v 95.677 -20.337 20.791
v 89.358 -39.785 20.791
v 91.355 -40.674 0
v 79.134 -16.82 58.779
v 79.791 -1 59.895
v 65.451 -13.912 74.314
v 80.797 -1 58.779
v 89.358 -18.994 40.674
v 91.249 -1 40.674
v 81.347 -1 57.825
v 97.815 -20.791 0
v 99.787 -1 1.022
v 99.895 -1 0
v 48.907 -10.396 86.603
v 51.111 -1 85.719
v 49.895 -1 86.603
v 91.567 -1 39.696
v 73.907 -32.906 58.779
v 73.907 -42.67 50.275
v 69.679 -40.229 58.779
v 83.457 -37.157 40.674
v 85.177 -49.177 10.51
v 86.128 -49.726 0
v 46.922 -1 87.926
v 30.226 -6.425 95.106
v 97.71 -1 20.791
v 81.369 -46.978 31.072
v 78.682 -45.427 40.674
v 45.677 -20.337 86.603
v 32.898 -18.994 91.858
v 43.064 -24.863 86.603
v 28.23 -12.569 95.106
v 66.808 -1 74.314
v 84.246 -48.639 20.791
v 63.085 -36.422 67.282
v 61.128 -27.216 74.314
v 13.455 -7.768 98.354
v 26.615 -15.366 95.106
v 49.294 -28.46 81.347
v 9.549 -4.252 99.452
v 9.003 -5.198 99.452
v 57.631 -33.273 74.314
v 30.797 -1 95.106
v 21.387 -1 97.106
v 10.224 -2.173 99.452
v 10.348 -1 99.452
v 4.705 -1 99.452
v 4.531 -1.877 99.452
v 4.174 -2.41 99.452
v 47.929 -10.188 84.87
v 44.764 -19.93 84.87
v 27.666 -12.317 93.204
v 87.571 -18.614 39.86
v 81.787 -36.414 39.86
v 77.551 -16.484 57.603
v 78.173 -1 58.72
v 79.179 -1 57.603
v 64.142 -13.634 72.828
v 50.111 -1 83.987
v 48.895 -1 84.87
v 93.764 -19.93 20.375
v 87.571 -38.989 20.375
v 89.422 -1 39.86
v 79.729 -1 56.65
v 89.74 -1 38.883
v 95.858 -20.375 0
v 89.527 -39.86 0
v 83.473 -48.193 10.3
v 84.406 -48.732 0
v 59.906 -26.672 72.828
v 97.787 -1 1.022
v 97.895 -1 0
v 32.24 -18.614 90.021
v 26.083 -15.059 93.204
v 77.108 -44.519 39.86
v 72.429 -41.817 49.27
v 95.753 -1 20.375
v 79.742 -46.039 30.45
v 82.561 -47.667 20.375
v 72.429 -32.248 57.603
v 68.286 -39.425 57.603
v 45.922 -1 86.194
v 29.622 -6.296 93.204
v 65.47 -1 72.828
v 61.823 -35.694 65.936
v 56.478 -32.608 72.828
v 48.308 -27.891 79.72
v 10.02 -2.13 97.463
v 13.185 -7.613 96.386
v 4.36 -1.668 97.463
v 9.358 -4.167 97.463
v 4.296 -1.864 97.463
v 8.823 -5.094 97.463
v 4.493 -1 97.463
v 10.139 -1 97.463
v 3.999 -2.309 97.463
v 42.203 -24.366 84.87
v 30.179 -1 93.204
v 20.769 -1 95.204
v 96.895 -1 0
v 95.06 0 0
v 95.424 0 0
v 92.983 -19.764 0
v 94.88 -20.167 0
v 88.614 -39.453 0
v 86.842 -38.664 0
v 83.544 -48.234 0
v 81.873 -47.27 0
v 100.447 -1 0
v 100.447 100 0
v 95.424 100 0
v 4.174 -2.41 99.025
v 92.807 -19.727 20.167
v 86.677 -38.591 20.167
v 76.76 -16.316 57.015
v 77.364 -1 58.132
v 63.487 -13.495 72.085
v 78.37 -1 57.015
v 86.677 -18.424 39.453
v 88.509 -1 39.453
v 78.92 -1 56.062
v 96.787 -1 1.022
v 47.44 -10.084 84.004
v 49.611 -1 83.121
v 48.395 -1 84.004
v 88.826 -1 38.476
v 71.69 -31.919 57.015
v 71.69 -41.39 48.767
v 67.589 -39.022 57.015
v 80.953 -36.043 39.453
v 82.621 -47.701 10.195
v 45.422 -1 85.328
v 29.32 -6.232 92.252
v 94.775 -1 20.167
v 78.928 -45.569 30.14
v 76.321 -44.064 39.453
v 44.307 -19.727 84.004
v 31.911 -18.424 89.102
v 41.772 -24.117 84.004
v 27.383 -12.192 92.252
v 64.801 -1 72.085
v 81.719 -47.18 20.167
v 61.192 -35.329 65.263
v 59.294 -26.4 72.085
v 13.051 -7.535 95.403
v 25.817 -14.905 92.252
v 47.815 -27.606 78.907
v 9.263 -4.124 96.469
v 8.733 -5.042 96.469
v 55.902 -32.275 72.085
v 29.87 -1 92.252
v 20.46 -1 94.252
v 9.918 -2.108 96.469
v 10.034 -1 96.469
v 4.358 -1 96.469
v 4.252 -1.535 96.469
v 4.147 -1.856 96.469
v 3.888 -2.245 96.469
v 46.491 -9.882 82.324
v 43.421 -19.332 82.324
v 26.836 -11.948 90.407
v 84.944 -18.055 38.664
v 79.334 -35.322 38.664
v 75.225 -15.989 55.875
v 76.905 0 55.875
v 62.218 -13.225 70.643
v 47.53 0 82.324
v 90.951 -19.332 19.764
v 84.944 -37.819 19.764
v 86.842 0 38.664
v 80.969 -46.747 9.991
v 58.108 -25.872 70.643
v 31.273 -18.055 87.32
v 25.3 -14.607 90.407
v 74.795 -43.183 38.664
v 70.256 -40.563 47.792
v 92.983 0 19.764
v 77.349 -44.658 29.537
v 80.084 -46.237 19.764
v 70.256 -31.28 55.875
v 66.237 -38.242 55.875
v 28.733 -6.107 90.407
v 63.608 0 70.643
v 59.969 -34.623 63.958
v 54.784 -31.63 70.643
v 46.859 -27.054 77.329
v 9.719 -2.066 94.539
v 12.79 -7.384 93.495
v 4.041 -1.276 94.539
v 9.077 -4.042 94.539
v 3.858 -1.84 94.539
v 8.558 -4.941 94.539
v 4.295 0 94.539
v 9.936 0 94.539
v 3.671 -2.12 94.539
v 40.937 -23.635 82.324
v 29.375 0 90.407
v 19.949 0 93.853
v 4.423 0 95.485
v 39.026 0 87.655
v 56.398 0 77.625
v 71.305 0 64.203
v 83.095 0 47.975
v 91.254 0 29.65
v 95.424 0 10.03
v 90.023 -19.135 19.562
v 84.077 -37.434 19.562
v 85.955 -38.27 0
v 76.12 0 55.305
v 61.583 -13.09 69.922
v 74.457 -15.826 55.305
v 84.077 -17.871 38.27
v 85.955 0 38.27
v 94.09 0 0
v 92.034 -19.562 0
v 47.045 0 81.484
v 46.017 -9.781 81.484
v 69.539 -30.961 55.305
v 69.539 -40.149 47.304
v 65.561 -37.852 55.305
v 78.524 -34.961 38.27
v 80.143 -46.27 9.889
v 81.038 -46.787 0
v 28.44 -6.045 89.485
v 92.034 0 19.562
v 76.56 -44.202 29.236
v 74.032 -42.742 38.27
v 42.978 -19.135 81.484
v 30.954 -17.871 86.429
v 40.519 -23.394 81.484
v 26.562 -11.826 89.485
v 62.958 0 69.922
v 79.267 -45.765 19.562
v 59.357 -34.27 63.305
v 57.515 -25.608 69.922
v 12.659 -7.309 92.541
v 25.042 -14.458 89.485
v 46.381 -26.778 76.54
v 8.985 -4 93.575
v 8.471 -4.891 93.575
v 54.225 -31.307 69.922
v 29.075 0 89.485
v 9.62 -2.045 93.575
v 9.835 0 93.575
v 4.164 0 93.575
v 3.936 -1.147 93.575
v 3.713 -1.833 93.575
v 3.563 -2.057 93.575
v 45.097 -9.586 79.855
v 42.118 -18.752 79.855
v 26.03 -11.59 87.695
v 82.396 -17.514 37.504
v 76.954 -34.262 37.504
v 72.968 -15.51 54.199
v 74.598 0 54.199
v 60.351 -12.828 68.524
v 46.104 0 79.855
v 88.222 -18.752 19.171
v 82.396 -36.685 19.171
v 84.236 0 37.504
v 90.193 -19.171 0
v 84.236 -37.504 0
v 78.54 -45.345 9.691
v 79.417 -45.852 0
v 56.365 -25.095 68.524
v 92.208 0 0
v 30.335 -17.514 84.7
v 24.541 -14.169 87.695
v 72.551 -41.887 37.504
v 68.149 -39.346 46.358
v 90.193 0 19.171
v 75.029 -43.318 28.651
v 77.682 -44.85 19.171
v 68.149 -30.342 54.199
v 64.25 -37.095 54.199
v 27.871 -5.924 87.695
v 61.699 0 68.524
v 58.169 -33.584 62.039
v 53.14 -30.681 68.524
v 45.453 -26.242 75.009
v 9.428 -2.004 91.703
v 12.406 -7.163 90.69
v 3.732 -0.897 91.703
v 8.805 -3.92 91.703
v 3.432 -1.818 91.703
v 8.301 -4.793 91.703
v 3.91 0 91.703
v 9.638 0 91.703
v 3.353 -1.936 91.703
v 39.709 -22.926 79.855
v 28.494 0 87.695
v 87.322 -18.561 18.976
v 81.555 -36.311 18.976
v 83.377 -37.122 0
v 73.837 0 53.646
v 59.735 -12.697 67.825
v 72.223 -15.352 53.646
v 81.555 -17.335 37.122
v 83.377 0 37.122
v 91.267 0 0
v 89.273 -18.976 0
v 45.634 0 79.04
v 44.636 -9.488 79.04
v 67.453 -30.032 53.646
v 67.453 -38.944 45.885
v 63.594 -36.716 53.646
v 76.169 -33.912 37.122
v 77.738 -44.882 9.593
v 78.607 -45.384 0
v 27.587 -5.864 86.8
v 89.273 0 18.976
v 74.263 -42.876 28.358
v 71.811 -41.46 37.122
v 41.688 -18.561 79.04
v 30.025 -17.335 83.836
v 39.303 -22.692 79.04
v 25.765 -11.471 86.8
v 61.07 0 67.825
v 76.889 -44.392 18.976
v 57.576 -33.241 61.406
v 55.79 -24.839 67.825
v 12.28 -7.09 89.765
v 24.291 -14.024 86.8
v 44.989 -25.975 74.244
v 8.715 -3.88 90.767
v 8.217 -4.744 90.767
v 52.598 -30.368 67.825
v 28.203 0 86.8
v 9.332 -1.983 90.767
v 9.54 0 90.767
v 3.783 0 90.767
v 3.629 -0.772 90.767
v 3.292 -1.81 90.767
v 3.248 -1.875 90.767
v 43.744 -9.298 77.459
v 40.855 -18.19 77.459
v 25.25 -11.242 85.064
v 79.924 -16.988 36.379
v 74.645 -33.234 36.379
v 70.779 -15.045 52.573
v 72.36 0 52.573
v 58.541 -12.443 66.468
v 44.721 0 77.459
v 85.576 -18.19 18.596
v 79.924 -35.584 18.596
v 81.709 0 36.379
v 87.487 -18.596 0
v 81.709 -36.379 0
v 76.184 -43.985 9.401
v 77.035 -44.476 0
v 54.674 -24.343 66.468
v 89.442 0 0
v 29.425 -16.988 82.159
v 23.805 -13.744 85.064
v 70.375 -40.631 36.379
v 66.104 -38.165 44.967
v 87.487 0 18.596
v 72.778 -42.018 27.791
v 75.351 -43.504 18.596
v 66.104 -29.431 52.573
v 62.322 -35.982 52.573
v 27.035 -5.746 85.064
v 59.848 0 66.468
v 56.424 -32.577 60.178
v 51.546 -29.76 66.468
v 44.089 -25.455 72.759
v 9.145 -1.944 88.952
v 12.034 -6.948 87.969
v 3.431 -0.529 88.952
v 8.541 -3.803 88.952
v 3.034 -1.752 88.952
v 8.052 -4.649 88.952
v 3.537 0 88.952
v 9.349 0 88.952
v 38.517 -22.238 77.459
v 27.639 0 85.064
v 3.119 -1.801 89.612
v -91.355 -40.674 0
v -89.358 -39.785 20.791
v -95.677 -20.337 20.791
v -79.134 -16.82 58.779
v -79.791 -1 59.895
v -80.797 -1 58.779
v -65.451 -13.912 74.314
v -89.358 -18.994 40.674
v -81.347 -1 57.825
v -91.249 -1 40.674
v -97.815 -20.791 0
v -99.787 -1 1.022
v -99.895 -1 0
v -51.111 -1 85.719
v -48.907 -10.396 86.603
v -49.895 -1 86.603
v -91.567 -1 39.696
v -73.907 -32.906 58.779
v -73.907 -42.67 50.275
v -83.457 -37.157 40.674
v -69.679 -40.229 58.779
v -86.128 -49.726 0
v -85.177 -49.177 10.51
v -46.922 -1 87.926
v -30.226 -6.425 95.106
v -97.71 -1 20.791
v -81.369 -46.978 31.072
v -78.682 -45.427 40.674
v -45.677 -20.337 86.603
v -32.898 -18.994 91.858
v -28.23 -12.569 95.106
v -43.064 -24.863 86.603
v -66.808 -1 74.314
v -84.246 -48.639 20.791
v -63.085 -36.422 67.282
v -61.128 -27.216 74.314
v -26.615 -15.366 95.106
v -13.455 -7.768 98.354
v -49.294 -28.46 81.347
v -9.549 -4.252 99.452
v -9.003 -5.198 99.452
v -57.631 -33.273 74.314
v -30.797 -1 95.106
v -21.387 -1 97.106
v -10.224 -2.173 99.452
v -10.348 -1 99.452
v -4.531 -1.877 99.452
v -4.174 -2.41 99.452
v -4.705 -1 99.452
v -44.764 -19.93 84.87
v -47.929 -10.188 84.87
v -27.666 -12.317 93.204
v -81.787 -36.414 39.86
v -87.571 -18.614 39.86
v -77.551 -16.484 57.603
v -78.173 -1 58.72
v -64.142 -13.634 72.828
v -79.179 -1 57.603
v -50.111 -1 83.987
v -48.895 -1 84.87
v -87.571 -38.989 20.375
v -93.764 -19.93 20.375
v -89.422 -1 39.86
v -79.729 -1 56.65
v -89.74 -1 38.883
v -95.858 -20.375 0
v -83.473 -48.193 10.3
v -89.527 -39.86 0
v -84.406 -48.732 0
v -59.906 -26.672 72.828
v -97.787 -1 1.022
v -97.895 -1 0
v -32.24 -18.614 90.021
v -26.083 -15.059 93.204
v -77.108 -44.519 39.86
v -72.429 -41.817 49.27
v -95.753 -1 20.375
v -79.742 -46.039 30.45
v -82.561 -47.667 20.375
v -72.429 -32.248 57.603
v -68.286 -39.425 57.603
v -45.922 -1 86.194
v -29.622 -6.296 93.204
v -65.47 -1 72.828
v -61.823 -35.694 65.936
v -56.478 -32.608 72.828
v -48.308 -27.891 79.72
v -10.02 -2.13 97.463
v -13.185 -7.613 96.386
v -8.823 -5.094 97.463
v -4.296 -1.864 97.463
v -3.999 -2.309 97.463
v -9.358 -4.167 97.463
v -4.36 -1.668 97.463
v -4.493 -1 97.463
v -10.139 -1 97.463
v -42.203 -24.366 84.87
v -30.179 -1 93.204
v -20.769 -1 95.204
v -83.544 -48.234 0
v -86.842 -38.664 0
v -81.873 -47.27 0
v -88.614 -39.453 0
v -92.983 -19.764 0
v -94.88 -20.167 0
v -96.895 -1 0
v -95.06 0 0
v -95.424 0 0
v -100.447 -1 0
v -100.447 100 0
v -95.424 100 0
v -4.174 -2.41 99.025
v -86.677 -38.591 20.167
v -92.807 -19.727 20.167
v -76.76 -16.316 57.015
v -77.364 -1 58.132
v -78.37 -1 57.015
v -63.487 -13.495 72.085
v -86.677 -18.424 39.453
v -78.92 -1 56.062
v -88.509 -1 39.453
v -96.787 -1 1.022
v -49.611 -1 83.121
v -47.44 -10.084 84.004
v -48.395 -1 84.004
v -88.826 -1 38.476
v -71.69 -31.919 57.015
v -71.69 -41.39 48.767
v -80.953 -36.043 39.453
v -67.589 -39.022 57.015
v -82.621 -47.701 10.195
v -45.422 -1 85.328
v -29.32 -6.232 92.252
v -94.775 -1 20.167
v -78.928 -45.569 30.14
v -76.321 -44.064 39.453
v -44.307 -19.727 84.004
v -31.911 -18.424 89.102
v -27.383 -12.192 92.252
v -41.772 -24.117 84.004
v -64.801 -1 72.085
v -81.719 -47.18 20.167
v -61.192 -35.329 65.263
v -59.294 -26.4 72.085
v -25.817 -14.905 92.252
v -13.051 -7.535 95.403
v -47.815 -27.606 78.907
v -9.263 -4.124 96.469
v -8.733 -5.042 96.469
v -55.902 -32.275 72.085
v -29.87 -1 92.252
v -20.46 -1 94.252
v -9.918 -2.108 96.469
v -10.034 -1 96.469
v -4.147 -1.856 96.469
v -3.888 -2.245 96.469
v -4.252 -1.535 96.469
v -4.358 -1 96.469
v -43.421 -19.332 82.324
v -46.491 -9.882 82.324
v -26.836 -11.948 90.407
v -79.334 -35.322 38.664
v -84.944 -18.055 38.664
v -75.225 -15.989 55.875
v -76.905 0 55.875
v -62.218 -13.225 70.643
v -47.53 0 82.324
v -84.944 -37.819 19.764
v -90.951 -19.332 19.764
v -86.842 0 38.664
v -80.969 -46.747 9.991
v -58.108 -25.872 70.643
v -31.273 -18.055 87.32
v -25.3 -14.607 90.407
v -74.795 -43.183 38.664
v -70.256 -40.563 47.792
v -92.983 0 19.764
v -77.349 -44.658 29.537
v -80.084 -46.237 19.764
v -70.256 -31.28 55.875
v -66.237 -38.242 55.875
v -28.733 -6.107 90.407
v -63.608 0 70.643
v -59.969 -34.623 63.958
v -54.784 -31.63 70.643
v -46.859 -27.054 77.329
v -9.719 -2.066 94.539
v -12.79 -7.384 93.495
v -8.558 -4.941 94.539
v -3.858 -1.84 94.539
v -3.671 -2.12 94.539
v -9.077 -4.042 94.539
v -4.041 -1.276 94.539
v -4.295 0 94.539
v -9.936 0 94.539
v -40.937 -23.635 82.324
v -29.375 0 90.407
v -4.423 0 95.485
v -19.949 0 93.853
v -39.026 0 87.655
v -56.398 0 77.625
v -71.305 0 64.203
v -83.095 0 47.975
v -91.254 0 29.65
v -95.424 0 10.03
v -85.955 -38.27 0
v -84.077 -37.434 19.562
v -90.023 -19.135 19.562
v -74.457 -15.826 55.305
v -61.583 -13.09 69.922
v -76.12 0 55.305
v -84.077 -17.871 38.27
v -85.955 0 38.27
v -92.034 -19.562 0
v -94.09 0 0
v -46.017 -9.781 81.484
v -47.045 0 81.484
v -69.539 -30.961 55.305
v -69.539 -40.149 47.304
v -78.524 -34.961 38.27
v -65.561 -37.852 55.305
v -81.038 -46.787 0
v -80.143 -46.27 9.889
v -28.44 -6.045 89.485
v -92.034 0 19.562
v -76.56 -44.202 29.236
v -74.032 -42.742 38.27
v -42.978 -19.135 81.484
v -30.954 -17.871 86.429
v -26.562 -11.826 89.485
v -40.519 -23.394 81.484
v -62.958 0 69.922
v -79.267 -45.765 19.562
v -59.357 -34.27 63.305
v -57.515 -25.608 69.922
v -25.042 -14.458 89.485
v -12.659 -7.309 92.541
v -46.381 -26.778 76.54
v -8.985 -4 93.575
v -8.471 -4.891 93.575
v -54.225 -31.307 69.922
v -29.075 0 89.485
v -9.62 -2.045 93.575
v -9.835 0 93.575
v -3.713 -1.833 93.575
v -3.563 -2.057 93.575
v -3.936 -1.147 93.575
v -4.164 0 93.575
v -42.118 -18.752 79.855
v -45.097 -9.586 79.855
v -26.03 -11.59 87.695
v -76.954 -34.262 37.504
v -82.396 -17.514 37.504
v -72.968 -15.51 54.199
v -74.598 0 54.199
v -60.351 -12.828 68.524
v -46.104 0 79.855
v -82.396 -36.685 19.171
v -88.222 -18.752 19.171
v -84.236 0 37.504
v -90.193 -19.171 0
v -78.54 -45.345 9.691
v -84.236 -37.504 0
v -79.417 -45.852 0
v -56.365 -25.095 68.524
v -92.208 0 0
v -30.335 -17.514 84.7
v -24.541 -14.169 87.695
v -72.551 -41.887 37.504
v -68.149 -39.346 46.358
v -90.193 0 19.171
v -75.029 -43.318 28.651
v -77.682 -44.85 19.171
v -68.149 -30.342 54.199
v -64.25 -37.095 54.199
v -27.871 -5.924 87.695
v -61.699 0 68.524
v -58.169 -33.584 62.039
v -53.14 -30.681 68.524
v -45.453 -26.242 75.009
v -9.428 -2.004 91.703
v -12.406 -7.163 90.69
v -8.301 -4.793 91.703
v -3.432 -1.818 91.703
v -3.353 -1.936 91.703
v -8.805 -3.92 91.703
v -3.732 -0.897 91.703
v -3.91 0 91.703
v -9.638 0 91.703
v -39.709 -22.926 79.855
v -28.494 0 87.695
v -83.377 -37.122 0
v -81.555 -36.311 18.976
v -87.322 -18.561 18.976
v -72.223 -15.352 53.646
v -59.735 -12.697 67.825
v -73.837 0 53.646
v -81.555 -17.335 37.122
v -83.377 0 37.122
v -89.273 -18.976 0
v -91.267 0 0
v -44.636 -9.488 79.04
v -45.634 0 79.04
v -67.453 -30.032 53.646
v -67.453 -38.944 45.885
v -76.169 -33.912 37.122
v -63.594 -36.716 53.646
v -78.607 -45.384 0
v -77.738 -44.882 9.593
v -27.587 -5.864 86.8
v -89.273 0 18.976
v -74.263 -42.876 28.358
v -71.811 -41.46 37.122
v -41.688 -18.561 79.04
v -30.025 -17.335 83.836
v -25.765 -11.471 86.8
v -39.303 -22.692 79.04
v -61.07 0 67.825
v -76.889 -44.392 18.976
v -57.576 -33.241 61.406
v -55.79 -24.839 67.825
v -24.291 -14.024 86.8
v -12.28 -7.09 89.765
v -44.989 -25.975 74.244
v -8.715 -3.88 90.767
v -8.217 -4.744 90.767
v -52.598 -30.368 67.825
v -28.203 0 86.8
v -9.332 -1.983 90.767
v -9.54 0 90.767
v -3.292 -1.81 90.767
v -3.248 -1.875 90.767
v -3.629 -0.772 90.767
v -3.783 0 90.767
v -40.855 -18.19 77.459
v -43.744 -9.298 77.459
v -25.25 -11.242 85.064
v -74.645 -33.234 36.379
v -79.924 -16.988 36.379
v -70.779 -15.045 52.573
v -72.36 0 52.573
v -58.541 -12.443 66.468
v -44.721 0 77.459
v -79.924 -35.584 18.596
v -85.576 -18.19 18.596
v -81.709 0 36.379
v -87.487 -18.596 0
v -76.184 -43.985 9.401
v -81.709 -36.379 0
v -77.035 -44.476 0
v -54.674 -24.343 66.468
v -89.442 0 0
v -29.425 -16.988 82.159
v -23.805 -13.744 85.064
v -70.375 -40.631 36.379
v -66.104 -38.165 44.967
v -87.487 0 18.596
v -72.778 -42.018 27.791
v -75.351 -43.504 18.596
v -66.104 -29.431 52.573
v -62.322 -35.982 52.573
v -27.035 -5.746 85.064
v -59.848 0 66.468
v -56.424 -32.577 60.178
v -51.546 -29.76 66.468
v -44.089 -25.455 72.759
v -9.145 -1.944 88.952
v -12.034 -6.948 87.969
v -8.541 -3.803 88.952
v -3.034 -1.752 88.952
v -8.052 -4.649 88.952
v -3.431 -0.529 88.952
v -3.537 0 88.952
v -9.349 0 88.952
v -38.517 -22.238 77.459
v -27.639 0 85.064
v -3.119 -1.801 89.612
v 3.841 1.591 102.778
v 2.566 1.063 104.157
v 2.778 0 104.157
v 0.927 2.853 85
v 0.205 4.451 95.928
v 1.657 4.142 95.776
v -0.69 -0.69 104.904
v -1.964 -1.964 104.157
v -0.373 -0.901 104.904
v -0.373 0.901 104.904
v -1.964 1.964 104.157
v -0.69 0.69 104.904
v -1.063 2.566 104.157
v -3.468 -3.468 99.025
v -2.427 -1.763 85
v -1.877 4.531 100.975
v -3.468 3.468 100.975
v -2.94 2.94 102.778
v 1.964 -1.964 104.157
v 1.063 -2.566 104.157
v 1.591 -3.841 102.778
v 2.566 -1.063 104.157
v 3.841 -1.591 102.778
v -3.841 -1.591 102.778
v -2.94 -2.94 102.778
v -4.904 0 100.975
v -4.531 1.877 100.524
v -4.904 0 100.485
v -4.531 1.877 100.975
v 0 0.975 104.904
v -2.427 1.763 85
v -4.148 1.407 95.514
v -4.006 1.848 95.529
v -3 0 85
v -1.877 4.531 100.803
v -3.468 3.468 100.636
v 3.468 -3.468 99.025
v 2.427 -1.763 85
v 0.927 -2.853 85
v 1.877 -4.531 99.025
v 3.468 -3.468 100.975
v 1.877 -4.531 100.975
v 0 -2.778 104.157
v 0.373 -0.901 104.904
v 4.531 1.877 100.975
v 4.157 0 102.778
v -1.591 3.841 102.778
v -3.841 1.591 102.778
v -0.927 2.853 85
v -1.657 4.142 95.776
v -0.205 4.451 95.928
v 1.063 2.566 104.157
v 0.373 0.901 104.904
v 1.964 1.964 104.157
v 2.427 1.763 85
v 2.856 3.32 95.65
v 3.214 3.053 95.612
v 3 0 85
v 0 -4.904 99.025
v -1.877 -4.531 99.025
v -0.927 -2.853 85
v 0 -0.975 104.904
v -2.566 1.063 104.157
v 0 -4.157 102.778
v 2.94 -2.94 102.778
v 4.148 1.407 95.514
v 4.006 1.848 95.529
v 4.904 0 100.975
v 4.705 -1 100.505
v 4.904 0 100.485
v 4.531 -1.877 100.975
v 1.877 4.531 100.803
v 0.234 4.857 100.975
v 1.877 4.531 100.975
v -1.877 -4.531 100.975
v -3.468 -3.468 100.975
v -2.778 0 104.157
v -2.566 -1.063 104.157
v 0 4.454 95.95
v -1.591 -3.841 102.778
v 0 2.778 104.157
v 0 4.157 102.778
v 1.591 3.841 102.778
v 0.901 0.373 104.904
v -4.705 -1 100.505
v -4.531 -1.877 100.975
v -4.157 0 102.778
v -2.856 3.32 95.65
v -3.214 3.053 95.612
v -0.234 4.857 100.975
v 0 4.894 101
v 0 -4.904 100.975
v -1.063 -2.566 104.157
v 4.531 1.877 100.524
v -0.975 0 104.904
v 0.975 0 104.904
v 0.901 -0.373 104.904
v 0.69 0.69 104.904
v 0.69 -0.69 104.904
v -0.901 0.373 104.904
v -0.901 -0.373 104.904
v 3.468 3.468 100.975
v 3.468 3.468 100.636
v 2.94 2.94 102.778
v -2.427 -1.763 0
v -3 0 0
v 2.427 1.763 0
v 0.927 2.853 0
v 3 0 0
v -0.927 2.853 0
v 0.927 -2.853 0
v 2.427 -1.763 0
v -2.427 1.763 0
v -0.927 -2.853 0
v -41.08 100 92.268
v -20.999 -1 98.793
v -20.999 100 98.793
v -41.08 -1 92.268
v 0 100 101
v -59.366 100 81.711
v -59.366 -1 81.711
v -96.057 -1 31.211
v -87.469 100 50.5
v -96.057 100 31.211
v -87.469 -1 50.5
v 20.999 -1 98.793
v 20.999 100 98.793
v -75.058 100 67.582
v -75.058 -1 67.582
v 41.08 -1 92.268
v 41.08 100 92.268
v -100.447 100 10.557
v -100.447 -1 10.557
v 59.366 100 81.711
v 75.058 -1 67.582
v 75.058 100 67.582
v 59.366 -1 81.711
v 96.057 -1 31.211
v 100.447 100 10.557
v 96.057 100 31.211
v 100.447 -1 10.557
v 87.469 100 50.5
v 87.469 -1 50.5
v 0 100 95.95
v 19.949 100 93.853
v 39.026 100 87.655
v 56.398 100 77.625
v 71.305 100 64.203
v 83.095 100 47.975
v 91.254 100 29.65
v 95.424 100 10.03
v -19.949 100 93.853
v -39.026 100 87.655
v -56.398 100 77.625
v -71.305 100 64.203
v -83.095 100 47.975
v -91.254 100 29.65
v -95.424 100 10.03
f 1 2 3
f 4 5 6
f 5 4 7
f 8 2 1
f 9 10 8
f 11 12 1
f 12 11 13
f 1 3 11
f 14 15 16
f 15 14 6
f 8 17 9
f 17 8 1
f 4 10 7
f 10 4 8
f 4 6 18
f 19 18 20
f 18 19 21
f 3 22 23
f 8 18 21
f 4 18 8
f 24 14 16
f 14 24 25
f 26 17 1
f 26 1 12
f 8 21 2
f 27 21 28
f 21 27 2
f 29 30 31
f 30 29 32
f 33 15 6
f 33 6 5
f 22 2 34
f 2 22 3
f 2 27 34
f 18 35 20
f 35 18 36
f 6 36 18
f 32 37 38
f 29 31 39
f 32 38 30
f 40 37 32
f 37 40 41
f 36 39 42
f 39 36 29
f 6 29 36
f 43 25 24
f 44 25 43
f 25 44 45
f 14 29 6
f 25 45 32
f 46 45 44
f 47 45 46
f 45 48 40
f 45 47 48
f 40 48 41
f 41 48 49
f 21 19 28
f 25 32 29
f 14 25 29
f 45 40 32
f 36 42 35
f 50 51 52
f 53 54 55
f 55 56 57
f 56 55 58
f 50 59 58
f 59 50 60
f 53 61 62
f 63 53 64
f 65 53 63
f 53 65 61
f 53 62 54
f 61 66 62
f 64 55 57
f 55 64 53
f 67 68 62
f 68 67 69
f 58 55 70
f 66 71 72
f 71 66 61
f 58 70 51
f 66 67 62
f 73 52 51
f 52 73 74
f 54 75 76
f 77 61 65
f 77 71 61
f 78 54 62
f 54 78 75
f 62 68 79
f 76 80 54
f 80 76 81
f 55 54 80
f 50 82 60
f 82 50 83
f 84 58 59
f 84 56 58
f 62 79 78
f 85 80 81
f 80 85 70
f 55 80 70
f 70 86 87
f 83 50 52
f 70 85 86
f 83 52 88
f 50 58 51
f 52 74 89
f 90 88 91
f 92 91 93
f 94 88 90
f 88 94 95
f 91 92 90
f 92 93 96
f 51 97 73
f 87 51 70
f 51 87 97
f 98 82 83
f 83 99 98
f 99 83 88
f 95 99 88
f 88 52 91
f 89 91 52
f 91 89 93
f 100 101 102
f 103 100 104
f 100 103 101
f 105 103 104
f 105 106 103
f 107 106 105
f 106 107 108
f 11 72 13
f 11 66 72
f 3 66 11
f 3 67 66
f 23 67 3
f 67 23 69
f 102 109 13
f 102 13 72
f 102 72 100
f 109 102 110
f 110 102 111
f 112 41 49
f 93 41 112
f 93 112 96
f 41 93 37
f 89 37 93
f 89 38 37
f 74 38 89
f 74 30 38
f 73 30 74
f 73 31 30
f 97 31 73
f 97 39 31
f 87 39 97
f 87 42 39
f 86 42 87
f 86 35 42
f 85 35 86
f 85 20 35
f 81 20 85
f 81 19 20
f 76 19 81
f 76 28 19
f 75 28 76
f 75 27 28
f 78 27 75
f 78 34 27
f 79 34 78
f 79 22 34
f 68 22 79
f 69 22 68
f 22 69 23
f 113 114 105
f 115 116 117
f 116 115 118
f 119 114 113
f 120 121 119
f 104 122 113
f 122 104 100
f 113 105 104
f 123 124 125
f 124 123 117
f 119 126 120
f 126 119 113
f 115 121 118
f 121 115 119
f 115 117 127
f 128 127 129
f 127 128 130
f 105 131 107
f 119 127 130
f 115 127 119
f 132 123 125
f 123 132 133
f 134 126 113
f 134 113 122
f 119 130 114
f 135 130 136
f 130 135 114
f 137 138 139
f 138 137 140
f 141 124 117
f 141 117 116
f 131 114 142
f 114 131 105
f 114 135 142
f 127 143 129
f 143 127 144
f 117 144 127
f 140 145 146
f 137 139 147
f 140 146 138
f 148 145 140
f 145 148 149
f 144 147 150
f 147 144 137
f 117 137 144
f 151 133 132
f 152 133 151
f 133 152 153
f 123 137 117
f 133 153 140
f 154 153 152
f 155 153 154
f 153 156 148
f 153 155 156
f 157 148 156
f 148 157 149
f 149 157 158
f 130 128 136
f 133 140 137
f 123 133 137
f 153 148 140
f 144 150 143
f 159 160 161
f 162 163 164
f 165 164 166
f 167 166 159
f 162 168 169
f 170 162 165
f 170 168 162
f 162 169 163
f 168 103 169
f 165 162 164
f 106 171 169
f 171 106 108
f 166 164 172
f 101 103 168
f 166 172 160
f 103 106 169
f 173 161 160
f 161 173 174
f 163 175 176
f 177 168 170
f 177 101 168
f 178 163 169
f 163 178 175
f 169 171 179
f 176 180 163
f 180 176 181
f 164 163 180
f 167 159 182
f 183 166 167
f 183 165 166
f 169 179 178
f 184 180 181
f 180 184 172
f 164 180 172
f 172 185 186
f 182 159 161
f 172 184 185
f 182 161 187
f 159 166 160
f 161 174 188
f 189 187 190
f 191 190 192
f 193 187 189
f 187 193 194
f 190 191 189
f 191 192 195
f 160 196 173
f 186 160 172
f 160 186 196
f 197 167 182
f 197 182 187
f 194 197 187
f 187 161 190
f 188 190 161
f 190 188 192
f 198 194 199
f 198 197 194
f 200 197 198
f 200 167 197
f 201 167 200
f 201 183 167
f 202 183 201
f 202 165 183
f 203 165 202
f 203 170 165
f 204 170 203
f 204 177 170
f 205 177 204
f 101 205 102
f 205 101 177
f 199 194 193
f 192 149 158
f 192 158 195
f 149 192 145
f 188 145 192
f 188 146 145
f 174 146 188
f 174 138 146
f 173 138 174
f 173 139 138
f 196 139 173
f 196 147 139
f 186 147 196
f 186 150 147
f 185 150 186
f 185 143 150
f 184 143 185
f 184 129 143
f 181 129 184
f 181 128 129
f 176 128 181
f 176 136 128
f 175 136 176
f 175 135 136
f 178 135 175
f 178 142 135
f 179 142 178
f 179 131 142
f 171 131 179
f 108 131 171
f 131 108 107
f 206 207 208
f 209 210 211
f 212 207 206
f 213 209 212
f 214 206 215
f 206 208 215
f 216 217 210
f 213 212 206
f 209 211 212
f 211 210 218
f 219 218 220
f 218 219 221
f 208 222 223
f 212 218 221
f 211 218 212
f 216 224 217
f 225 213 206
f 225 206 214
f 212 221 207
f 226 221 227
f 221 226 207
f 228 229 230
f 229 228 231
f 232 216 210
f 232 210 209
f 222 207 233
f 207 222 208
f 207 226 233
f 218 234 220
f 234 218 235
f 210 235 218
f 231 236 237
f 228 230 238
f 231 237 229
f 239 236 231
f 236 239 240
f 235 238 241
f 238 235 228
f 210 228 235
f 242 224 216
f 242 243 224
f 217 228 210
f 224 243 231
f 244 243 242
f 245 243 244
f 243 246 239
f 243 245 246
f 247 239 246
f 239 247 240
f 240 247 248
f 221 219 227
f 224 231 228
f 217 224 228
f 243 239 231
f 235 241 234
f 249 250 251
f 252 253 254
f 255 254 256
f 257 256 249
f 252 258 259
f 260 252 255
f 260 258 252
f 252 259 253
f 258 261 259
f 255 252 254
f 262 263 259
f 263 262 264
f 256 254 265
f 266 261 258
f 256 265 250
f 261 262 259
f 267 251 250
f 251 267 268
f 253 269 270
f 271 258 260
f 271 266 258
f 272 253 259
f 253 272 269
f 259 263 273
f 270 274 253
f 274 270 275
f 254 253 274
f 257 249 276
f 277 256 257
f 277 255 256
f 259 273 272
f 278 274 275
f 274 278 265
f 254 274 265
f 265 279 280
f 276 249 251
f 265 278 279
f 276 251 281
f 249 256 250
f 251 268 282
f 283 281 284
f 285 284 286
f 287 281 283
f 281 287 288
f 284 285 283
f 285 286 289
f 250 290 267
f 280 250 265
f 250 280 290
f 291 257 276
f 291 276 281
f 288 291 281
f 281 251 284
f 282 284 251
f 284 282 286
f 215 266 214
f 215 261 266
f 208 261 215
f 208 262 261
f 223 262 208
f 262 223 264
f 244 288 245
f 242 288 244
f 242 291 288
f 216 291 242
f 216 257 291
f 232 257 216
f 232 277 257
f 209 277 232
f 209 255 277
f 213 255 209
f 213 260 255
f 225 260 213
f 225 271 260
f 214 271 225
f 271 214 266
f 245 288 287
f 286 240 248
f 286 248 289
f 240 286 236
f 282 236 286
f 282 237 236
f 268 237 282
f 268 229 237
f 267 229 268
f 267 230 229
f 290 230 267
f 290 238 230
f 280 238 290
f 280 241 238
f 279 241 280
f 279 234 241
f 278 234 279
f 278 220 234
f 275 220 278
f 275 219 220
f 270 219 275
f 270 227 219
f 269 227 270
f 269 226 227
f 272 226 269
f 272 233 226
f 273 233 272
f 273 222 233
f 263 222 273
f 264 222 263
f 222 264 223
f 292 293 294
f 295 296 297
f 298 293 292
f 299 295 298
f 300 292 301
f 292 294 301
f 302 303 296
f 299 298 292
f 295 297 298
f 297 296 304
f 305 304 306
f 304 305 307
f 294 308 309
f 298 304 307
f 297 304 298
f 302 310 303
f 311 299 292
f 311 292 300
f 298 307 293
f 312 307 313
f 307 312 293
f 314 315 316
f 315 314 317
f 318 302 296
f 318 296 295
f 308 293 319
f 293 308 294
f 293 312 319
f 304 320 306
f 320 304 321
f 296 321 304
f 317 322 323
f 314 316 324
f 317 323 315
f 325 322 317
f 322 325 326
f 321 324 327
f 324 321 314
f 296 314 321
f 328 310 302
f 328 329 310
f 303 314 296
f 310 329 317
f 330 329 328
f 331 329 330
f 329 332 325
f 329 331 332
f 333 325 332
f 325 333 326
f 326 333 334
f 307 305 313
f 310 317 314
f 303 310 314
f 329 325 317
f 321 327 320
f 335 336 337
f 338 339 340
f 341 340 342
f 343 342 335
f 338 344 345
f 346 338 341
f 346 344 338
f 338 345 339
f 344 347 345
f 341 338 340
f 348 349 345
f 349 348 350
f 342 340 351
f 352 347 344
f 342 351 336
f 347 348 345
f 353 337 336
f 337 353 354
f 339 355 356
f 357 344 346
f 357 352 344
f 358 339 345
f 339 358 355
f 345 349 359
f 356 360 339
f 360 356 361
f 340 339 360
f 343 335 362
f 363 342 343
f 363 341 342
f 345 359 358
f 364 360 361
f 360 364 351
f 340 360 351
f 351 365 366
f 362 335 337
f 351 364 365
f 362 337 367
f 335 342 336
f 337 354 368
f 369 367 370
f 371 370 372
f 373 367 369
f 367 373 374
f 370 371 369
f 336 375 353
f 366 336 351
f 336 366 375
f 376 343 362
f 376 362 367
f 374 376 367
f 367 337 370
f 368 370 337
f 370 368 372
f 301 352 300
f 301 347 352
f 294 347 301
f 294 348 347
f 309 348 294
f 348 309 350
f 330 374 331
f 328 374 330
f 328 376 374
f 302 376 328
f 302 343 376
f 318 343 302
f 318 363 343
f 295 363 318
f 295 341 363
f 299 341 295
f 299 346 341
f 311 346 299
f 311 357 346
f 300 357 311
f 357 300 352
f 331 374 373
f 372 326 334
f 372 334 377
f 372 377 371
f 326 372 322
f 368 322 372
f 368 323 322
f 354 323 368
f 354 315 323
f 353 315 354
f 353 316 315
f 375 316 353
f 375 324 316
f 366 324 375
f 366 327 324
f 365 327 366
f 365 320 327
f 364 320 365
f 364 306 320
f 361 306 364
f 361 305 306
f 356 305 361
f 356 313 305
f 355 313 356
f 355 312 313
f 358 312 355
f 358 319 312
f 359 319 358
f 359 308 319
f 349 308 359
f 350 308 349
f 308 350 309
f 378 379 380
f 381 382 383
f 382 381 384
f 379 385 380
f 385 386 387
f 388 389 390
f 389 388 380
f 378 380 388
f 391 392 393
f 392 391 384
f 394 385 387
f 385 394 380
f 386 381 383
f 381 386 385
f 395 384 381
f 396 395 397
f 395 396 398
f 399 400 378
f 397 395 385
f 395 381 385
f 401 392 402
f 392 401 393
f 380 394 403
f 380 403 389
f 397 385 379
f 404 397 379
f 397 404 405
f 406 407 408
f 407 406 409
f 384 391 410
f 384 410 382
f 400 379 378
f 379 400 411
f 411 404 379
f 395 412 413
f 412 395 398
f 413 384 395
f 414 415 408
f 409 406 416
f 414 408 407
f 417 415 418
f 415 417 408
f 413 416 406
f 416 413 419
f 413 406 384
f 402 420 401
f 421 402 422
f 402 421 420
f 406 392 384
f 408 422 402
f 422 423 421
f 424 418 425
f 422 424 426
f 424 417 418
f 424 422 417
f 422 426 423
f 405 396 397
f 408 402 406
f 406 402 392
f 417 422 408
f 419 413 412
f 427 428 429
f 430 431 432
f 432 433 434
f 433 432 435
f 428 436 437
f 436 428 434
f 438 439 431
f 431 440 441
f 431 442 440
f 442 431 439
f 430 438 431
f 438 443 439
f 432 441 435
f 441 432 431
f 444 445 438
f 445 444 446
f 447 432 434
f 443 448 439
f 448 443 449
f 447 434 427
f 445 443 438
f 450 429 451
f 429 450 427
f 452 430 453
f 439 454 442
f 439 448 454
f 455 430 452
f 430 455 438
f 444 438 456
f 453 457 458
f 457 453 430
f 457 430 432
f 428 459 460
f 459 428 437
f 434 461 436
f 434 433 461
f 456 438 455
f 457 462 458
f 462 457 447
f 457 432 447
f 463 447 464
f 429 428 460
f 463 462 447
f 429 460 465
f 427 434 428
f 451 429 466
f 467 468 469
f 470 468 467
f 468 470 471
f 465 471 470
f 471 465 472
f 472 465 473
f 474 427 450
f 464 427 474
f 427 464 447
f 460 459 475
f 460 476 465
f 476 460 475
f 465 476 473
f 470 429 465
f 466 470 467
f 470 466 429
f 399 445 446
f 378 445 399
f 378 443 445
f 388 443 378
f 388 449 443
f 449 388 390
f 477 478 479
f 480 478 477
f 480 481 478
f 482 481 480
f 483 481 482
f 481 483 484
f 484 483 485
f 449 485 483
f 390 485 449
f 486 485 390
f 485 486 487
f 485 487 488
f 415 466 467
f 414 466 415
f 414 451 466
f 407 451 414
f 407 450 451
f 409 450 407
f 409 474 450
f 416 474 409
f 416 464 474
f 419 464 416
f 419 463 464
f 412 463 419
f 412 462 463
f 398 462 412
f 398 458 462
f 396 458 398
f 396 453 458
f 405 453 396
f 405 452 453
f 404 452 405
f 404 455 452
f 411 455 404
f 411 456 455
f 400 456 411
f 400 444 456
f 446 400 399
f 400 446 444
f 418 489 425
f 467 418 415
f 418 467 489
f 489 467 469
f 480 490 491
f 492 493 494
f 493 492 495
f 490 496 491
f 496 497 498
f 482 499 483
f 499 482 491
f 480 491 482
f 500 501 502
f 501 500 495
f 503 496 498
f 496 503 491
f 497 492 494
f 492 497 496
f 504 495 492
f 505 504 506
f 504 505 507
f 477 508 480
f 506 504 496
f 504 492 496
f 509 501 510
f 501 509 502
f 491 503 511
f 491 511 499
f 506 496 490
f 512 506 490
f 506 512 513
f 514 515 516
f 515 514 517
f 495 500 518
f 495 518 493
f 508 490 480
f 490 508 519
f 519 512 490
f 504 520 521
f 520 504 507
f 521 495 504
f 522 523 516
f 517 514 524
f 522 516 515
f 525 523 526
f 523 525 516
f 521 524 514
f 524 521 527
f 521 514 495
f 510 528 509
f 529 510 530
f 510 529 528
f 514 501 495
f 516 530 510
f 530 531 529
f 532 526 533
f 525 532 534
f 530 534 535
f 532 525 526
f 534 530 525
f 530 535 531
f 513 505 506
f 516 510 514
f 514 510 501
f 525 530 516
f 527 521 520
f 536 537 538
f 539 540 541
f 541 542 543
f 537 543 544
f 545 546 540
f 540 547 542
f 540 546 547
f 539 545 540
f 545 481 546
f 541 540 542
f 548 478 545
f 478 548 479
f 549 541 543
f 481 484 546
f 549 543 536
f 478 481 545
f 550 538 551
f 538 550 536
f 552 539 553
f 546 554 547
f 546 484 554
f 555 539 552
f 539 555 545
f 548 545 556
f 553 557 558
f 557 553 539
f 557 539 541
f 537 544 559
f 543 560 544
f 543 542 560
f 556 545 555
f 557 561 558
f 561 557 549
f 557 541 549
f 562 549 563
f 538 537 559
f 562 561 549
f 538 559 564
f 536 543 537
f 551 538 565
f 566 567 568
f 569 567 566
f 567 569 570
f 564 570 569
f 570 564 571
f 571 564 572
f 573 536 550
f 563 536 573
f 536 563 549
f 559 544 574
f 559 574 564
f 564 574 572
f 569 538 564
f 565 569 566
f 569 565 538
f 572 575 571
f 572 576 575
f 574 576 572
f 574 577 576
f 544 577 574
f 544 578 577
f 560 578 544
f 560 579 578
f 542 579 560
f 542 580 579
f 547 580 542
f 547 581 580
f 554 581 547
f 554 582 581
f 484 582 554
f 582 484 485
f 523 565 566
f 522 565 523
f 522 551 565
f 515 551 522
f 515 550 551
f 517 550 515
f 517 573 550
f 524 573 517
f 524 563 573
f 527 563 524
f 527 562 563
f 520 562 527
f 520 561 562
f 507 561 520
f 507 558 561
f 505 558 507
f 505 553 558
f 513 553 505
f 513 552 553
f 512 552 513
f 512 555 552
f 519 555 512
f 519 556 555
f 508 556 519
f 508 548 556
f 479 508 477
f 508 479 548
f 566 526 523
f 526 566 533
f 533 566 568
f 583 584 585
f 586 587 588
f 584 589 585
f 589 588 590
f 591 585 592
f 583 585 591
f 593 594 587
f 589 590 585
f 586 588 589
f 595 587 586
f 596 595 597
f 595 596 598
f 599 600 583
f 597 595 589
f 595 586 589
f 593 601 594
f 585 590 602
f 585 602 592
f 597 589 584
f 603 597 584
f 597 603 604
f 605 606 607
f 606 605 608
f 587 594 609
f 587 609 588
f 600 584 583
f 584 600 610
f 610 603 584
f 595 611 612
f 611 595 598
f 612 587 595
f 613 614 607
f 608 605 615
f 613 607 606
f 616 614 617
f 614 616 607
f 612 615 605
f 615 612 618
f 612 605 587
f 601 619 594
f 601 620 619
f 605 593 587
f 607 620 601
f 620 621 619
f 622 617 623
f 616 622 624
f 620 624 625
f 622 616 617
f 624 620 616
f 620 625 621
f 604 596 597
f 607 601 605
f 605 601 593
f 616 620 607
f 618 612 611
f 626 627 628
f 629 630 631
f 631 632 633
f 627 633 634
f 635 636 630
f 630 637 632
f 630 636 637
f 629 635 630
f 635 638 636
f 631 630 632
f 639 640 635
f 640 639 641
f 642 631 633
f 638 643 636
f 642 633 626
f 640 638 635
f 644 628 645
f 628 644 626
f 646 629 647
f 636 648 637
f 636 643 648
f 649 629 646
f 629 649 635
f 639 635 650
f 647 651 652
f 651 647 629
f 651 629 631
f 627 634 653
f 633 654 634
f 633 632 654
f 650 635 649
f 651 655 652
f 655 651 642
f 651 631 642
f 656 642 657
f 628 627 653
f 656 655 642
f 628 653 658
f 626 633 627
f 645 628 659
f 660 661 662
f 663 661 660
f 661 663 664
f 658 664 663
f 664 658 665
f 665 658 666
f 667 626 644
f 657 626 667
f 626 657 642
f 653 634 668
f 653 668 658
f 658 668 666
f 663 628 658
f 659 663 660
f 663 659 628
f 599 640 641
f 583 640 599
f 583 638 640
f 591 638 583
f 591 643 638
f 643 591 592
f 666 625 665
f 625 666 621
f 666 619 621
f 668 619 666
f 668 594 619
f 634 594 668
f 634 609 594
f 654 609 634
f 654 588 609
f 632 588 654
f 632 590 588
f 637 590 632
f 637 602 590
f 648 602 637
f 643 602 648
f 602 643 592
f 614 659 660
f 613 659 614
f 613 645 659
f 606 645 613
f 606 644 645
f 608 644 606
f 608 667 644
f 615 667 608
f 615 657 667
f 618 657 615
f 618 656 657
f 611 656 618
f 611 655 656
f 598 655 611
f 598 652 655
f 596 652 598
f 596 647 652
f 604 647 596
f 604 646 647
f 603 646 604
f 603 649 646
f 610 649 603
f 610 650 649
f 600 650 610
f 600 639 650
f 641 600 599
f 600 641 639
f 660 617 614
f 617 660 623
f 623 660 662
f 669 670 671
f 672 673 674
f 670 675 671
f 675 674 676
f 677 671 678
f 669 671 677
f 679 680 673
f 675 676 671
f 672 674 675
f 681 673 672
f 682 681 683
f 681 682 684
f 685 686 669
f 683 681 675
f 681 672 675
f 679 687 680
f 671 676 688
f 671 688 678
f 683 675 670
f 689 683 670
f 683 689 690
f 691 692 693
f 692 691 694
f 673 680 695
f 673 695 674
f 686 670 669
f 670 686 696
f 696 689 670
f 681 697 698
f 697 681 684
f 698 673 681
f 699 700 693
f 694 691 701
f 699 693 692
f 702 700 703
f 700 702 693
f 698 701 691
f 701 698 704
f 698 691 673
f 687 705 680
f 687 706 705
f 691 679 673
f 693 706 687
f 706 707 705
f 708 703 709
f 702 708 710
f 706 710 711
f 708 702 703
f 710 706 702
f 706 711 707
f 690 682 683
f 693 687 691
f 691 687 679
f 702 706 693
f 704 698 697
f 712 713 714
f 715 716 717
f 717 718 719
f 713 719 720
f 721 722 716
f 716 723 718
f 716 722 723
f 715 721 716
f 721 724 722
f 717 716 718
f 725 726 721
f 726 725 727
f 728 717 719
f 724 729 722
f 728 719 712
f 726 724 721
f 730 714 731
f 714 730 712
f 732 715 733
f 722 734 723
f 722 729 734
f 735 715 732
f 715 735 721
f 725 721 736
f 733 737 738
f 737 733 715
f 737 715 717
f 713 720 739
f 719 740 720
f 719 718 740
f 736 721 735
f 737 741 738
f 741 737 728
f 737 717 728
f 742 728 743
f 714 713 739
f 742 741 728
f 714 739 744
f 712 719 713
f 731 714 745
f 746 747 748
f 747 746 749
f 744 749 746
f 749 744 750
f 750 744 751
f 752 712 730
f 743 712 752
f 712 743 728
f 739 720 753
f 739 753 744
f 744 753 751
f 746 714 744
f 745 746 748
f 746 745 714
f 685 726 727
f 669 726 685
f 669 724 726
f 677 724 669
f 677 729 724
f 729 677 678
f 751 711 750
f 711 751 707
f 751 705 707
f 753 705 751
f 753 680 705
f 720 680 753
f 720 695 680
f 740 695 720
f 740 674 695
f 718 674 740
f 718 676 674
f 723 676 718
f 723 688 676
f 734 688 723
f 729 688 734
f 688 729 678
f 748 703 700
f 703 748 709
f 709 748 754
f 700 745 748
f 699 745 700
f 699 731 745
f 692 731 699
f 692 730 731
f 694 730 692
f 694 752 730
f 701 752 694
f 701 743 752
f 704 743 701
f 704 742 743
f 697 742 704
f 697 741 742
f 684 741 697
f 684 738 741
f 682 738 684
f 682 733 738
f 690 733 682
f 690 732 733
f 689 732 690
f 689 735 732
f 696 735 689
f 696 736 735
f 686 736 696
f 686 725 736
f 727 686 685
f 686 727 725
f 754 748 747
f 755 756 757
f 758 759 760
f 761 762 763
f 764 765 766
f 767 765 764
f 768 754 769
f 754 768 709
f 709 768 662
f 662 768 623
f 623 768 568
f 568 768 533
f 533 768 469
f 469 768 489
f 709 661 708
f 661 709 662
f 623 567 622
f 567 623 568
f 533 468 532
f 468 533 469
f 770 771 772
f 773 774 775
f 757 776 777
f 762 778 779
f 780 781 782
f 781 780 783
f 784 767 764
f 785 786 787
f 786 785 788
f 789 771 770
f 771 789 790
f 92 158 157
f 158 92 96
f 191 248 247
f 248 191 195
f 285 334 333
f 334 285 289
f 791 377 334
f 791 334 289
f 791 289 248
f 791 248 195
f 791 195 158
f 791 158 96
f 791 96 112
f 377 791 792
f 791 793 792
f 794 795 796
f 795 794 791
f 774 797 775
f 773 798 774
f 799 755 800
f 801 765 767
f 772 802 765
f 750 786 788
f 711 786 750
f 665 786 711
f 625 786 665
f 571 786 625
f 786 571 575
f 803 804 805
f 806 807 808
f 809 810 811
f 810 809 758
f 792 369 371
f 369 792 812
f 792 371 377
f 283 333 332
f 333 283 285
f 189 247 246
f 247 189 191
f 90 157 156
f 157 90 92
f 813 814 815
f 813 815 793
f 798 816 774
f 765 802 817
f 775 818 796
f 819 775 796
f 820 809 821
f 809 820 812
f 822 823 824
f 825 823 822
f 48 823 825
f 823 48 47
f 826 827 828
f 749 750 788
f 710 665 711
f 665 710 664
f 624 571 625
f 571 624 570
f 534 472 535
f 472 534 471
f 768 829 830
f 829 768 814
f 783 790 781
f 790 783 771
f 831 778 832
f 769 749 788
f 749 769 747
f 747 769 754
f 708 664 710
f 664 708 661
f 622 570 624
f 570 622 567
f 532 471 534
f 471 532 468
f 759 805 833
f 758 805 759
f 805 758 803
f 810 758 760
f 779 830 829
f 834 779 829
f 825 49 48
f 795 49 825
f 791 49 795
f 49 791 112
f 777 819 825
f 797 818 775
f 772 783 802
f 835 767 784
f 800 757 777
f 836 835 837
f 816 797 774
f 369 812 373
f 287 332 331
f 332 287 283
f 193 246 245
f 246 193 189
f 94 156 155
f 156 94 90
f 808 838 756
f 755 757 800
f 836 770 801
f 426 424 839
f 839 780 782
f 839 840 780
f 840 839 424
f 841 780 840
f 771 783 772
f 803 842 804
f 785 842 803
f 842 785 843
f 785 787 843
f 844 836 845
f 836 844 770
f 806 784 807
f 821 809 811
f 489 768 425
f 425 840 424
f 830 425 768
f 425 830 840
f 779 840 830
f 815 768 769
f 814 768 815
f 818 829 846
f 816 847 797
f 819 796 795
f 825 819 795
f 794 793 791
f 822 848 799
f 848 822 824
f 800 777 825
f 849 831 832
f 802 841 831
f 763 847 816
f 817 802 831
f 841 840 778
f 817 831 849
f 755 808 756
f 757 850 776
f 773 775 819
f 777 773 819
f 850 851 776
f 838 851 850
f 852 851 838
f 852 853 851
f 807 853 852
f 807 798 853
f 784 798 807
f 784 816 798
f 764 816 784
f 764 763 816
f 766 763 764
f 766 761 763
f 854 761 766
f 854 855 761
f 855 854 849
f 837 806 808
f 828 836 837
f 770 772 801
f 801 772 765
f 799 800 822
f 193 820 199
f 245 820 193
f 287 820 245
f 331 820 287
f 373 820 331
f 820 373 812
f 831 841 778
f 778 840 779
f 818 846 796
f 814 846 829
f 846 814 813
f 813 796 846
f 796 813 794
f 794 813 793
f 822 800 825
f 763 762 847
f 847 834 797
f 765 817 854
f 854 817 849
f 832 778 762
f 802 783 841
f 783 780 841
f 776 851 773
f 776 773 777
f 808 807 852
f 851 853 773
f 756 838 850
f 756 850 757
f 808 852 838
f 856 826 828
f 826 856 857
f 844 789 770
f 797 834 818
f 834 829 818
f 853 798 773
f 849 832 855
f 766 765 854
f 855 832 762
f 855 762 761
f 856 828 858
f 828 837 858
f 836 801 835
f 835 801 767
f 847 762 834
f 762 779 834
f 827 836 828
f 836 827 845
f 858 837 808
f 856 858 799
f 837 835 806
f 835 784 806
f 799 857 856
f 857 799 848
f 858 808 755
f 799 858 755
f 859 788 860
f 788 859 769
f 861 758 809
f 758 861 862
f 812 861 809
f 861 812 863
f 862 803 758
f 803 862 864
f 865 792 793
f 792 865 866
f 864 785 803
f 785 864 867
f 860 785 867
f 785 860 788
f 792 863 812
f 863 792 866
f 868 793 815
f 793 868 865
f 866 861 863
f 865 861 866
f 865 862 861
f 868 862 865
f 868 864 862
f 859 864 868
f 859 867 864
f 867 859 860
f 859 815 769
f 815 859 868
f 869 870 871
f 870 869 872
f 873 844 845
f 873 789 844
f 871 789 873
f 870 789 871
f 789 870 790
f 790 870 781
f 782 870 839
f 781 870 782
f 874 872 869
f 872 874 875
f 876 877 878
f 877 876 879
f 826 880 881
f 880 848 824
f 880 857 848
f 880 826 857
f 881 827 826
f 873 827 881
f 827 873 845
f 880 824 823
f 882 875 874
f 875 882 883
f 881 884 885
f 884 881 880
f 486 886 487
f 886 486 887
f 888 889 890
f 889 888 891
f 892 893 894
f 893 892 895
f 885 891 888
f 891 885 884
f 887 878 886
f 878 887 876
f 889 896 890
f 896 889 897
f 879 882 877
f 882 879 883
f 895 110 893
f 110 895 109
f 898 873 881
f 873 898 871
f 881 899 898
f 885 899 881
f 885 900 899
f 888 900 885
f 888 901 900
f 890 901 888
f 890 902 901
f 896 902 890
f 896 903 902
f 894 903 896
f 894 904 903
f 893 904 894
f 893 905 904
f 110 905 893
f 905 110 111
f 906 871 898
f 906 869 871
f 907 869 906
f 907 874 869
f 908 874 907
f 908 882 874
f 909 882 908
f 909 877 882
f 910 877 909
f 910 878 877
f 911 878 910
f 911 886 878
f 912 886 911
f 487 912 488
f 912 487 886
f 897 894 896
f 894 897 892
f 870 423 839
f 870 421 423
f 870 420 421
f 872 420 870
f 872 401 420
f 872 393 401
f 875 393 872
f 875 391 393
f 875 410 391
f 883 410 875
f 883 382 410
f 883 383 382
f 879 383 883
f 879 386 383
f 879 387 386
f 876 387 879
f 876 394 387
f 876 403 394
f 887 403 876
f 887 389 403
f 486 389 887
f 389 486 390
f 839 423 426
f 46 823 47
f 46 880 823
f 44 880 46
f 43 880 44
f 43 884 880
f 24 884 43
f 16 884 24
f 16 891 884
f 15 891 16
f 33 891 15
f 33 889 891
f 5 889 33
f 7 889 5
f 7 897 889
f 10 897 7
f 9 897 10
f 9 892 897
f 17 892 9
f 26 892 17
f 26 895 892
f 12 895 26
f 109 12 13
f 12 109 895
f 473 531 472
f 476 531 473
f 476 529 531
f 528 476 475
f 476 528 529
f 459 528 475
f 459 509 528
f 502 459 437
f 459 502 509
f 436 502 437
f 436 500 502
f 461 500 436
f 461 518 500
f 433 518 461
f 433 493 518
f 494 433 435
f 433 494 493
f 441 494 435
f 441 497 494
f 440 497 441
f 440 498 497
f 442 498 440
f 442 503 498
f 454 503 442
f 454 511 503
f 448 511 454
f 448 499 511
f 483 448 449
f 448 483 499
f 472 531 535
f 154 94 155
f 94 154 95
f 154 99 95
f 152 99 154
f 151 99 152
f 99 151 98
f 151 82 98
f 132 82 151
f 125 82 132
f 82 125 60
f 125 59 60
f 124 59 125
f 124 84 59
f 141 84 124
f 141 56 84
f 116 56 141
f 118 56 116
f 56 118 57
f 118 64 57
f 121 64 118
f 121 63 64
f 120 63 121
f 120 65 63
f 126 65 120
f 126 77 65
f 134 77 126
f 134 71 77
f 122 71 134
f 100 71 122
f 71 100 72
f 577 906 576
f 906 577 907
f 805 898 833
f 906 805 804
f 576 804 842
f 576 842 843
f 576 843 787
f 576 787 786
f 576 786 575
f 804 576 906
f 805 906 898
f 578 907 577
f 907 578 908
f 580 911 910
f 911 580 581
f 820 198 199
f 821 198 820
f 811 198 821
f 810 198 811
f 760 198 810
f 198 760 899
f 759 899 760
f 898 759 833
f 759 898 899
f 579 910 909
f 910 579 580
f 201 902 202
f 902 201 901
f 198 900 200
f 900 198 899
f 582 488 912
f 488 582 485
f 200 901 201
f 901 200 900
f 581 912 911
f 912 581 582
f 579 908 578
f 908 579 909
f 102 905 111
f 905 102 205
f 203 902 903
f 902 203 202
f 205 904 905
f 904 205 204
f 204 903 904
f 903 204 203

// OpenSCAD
color_metal = [0.8, 0.8, 0.8, 1];
color_glass = [1, 1, 1, 0.5];

module cupola(r=100) {
    difference() {
        sphere(r=r);
        sphere(r=r*0.98);
        translate([0, 0, -50])
            cube([3*r, 3*r, r], center=true);
    }
}

module cupola_half() {
    difference() {
        cupola();
        translate([0, 100, 0])
            cube([200, 200, 200], center=true);
    }
}

module cupola_quarter() {
    difference() {
        cupola_half();
        rotate([0, 0, 90])
            translate([0, 100, 0])
                cube([200, 200, 200], center=true);
    }
}

module cupola_twelveth() {
    difference() {
        cupola_quarter();
        rotate([0, 0, 90+60])
            translate([0, 100, 0])
                cube([200, 200, 200], center=true);
    }
}

module gate_door(closed_factor) {
    for(i = [0:3]) {
        scale(pow(0.97, i))
            rotate([0, 0, -20*i*closed_factor])
                cupola_twelveth();
    }
}

module halfpipe() {
    rotate([0, 270, 90])
    difference() {
        cylinder(r=100, h=100);
        cylinder(r=95, h=300, center=true);
        translate([-50, 0, 50]) 
            cube([100, 400, 400], center=true);
    }
}

module gate(closed_factor=0.5) {
    // Center
    hull() {
        translate([0, 0, 100]) sphere(r=5);
        translate([0, 0, 85]) sphere(r=3);
        //translate([0, 0, 90]) cylinder(r=5, h=10);
    }
    cylinder(r=3, h=90);
    
    gate_door(closed_factor);
    mirror() gate_door(closed_factor);
}

union() {
    
    progress = (min(2, max(1, 3*$t)) - 1);
    
    color(color_glass)
        gate(closed_factor=progress);
    
    color(color_metal)
        translate([0, 100, 0]) scale(1.01) halfpipe();
}
